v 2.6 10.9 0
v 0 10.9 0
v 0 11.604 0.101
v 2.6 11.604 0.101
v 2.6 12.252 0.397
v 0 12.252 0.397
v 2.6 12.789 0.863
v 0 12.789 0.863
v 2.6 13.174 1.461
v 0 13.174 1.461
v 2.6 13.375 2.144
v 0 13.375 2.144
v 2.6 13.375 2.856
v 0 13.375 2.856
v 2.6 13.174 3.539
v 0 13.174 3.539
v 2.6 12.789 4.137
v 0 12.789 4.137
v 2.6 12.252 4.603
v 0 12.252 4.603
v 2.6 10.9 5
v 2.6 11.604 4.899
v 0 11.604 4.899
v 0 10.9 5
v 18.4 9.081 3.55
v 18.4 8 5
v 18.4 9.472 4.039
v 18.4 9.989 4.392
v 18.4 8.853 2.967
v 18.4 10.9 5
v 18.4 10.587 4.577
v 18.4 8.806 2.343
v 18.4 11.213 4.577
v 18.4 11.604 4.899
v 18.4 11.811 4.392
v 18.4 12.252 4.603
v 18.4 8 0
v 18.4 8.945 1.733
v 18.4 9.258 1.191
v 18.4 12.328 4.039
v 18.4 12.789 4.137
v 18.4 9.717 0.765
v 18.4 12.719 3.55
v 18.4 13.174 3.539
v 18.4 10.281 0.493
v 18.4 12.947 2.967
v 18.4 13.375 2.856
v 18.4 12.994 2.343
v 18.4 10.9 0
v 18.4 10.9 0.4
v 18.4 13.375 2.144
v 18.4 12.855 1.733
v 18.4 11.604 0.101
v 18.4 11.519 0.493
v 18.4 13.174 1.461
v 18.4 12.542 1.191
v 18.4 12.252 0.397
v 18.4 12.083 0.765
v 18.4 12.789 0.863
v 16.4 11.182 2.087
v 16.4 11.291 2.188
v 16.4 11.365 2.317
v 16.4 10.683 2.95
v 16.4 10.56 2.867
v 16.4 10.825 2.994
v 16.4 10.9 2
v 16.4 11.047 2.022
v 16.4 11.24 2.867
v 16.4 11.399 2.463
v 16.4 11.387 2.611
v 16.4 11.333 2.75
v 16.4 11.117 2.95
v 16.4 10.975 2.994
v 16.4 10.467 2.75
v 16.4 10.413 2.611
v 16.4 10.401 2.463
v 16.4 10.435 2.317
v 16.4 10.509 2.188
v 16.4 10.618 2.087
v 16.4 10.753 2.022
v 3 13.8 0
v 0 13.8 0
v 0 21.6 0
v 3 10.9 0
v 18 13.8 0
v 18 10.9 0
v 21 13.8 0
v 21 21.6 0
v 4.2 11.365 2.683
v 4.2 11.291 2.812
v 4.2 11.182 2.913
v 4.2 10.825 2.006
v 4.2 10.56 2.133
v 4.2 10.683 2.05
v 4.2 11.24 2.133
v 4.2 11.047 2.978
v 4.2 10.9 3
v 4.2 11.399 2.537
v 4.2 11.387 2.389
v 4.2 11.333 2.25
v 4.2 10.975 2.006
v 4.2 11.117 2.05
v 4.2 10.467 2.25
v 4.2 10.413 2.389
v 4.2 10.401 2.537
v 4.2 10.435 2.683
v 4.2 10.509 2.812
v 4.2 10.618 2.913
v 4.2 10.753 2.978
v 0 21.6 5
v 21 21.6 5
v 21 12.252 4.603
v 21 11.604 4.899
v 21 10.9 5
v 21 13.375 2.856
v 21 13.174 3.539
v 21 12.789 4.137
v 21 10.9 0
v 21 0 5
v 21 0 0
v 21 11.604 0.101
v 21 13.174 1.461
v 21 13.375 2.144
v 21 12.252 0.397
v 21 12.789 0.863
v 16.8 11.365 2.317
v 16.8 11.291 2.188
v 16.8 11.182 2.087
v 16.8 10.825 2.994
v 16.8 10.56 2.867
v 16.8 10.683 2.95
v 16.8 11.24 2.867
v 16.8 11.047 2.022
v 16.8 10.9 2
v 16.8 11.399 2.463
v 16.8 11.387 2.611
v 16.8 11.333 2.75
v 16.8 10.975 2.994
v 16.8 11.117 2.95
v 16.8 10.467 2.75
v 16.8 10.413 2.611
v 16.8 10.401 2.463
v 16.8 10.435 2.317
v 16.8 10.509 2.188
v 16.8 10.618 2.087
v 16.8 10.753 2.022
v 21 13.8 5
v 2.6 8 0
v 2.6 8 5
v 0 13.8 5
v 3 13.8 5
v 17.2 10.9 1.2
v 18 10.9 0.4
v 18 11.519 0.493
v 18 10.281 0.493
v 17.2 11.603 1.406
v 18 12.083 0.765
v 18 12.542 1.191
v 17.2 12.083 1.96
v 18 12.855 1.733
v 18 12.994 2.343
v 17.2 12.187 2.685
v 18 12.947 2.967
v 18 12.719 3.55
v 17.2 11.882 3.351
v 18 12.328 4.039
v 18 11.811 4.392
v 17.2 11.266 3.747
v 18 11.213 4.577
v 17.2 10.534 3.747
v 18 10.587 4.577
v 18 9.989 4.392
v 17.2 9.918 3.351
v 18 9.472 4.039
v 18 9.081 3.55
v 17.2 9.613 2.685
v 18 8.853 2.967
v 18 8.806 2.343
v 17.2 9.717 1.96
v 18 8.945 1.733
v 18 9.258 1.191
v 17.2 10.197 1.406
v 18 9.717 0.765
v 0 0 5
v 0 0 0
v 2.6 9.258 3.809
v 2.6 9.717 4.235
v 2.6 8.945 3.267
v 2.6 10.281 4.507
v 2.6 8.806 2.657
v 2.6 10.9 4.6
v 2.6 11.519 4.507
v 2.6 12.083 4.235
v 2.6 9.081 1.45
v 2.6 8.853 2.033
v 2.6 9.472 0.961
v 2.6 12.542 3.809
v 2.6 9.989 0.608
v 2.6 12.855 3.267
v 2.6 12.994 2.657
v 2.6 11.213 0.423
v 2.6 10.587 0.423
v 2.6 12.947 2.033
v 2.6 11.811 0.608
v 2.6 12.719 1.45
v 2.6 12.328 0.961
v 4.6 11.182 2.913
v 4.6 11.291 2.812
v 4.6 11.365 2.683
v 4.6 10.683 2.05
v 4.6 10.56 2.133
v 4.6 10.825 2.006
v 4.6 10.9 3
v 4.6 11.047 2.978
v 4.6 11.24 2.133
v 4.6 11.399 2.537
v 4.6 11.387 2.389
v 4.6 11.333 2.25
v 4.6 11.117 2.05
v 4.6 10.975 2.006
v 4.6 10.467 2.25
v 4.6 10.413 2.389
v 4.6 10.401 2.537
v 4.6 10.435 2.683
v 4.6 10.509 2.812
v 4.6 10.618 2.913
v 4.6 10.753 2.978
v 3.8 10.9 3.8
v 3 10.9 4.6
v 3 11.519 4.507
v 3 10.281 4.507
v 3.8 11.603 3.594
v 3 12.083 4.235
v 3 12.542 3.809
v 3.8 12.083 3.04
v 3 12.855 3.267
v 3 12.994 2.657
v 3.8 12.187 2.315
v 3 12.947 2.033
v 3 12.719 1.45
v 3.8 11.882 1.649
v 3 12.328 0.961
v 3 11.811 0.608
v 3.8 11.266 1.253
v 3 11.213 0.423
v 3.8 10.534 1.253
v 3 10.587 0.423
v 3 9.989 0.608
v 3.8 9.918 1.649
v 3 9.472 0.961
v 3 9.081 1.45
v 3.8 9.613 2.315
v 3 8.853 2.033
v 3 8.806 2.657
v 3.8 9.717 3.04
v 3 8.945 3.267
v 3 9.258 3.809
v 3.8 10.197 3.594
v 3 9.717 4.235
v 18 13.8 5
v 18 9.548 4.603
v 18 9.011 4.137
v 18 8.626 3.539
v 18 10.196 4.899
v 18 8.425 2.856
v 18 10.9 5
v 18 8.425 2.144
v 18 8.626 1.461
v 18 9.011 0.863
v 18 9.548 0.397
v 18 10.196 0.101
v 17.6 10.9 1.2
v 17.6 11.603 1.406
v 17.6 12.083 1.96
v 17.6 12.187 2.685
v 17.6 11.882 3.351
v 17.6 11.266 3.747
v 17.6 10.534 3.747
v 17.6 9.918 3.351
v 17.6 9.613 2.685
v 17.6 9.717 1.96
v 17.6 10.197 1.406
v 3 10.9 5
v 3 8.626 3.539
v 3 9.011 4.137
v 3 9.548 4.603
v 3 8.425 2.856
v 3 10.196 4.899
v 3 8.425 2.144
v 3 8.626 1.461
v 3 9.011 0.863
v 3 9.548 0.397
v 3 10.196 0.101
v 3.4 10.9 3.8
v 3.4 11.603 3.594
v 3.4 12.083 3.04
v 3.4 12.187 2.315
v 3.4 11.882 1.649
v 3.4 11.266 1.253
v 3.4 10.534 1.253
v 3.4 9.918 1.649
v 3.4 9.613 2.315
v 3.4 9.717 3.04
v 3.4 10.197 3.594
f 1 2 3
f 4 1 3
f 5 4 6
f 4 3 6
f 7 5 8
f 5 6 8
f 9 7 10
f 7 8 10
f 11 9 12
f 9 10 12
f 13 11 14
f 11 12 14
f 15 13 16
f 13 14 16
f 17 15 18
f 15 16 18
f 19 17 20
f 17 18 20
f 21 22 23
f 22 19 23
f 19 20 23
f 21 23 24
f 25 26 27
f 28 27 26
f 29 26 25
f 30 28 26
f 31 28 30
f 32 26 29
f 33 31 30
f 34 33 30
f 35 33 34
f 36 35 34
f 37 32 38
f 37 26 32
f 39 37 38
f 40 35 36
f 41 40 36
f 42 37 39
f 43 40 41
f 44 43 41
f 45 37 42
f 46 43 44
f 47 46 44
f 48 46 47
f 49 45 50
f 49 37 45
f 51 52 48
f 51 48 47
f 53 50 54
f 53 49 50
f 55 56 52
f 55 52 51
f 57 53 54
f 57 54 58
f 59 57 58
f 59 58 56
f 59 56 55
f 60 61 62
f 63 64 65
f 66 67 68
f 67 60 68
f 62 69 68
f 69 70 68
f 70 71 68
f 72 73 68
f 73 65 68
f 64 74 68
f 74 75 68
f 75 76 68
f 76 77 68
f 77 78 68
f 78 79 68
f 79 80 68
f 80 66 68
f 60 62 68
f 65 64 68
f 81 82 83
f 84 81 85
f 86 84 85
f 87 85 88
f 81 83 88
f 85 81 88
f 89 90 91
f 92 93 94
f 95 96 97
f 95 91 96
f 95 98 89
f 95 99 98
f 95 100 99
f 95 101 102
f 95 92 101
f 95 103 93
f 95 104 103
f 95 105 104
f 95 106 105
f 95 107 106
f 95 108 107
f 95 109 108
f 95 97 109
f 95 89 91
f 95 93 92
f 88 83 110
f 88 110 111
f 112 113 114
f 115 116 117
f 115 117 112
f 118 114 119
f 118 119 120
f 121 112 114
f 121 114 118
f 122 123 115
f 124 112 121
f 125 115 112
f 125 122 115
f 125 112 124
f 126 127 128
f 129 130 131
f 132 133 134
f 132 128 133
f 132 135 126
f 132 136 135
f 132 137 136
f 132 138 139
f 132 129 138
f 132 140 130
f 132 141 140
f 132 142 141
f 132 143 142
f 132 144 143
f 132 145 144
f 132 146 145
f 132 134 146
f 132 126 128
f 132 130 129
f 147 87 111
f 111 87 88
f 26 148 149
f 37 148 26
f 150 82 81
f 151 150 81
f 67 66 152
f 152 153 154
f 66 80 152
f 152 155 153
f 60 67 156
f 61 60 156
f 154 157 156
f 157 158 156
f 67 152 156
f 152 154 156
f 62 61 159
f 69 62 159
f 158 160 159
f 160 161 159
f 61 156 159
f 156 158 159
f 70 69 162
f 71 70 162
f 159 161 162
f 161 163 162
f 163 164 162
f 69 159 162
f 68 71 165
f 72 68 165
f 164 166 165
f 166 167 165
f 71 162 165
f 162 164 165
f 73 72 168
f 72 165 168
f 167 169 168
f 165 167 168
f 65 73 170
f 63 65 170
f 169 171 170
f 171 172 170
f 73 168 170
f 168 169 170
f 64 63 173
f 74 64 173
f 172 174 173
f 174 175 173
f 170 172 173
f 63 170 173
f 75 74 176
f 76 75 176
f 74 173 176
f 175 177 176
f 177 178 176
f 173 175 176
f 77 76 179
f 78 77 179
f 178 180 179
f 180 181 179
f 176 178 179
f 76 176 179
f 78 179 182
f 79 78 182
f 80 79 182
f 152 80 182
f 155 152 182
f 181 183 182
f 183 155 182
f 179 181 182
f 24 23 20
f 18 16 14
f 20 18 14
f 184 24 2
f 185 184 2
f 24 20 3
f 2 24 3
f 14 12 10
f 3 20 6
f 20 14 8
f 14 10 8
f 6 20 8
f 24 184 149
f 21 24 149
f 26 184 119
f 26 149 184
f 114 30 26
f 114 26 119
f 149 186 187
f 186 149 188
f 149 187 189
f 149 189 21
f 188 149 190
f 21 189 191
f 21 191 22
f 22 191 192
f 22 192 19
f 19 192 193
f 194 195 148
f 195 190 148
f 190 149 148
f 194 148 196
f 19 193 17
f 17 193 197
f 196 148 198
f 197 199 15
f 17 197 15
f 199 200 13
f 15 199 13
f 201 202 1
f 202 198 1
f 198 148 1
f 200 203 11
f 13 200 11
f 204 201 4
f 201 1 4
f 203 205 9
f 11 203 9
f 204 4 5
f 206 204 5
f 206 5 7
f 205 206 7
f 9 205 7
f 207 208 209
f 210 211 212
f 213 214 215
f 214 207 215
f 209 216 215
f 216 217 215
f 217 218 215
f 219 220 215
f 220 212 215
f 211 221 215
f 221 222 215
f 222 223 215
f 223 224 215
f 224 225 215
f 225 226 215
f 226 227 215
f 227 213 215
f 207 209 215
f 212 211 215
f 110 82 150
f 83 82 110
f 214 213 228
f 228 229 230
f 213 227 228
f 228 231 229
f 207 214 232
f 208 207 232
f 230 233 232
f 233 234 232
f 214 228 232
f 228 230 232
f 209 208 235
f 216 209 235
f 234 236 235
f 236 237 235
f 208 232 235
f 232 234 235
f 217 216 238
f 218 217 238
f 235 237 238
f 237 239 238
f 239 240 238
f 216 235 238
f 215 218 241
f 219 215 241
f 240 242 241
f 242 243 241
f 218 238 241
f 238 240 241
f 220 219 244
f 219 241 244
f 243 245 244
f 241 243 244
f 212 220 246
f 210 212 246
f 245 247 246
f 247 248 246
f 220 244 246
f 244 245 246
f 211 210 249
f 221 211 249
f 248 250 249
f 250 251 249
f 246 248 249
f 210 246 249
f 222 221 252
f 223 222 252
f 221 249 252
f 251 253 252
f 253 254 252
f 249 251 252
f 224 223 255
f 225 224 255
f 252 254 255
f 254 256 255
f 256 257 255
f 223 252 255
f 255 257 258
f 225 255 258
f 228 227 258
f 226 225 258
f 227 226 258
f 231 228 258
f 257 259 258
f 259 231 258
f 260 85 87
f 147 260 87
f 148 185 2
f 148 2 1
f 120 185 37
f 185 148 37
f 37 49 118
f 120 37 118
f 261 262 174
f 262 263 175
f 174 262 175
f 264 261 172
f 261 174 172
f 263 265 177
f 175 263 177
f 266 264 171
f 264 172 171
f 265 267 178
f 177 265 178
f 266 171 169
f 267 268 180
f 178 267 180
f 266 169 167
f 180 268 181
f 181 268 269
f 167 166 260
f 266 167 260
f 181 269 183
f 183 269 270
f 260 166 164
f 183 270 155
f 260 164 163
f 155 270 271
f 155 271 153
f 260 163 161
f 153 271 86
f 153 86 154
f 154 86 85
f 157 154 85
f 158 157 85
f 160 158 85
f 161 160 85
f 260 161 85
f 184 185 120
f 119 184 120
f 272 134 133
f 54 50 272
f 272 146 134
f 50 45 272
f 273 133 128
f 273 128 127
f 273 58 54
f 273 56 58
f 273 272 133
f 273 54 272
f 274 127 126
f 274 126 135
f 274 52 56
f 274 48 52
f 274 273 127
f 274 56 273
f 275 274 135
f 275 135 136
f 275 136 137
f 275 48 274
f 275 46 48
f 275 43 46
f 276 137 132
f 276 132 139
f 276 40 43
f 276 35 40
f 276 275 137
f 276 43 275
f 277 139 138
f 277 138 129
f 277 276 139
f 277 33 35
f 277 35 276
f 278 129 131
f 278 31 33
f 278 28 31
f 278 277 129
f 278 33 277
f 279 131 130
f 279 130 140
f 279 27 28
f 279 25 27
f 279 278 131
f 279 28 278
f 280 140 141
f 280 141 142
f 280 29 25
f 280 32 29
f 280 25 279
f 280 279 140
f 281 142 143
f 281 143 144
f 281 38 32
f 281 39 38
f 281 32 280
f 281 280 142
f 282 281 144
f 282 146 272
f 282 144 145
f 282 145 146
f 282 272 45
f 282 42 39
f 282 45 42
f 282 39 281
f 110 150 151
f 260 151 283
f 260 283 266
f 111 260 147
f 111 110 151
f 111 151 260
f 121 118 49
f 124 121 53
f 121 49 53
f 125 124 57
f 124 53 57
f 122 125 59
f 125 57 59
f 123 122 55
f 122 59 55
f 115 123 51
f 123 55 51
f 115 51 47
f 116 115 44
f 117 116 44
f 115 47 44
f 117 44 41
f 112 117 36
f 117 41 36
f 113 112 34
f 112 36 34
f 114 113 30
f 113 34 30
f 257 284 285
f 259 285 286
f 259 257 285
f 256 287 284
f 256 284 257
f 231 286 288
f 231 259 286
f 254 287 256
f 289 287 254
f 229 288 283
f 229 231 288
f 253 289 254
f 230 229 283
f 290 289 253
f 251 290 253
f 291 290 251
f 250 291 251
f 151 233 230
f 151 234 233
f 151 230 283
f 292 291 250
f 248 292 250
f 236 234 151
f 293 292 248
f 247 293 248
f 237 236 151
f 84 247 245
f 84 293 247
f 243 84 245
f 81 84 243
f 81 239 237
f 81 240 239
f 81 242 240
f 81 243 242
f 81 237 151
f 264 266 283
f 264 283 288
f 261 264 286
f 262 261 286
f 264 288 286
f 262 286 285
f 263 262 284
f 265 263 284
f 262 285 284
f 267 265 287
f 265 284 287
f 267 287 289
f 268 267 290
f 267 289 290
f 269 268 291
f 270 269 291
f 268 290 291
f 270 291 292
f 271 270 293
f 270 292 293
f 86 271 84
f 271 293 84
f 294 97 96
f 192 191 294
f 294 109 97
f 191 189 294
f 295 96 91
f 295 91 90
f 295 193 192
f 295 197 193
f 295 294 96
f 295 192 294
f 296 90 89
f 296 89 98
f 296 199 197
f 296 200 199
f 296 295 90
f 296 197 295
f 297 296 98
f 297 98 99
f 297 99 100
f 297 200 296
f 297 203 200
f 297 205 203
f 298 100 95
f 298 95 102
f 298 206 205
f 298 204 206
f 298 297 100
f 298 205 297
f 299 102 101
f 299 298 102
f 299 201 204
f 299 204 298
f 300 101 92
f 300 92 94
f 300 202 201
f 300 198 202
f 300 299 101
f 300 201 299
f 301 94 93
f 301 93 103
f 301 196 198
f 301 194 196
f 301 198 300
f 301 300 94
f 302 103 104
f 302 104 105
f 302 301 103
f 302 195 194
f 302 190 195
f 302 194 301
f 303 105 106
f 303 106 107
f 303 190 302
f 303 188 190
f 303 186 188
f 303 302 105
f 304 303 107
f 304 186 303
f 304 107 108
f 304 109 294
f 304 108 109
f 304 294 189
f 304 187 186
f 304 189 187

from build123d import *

# Parameters (mm, degrees)
BOX001_W          = 15.8
BOX001_H          = 5.8
BOX001_DEPTH      = 5
CYLINDER_R        = 2.5
CYLINDER_DEPTH    = 21
BOX_W             = 21
BOX_H             = 10.9
BOX_DEPTH         = 5
BOX002_W          = 15
BOX002_H          = 10.5
BOX002_DEPTH      = 5
CYLINDER001_R     = 2.5
CYLINDER001_DEPTH = 15
BOX003_W          = 21
BOX003_H          = 7.8
BOX003_DEPTH      = 5


with BuildPart() as cone003:
    # Cone003 → Cone003 (revolve)
    with BuildSketch(Plane(origin=(16.8, 10.9, 2.5), x_dir=(0, 0, -1), z_dir=(0, -1, 0))):
        Polygon((0, 0), (0.5, 0), (2.1, 1.6), (0, 1.6), align=None)
    revolve(axis=Axis((16.8, 10.9, 2.5), (1, 0, 0)))


with BuildPart() as cube001:
    # Box001 → Box001 (new body)
    with BuildSketch(Plane(origin=(2.6, 8, 0), x_dir=(1, 0, 0), z_dir=(0, 0, 1))):
        with Locations((7.9, 2.9)):
            Rectangle(BOX001_W, BOX001_H)
    extrude(amount=BOX001_DEPTH)


with BuildPart() as cylinder:
    # Cylinder → Cylinder (new body)
    with BuildSketch(Plane(origin=(0, 10.9, 2.5), x_dir=(0, 0, -1), z_dir=(1, 0, 0))):
        Circle(CYLINDER_R)
    extrude(amount=CYLINDER_DEPTH)


with BuildPart() as cut:
    # Box → Box (new body)
    with BuildSketch(Plane.XY):
        with Locations((10.5, 5.45)):
            Rectangle(BOX_W, BOX_H)
    extrude(amount=BOX_DEPTH)

    # Fusion: union Cylinder
    add(cylinder.part)

    # Cut: cut Cube001
    add(cube001.part, mode=Mode.SUBTRACT)


with BuildPart() as fusion001:
    # Cone → Cone (revolve)
    with BuildSketch(Plane(origin=(4.2, 10.9, 2.5), x_dir=(0, 0, 1), z_dir=(0, -1, 0))):
        Polygon((0, 0), (0.5, 0), (2.1, 1.6), (0, 1.6), align=None)
    revolve(axis=Axis((4.2, 10.9, 2.5), (-1, 0, 0)))

    # Fusion001: union Cone003, Cut
    add(cone003.part)
    add(cut.part)


with BuildPart() as cone002:
    # Cone002 → Cone002 (revolve)
    with BuildSketch(Plane(origin=(4.6, 10.9, 2.5), x_dir=(0, 0, 1), z_dir=(0, -1, 0))):
        Polygon((0, 0), (0.5, 0), (2.5, 2), (0, 2), align=None)
    revolve(axis=Axis((4.6, 10.9, 2.5), (-1, 0, 0)))


with BuildPart() as fusion003:
    # Cone004 → Cone004 (revolve)
    with BuildSketch(Plane(origin=(16.4, 10.9, 2.5), x_dir=(0, 0, -1), z_dir=(0, -1, 0))):
        Polygon((0, 0), (0.5, 0), (2.5, 2), (0, 2), align=None)
    revolve(axis=Axis((16.4, 10.9, 2.5), (1, 0, 0)))

    # Fusion003: union Cone002
    add(cone002.part)


with BuildPart() as cube002:
    # Box002 → Box002 (new body)
    with BuildSketch(Plane(origin=(3, 10.9, 0), x_dir=(1, 0, 0), z_dir=(0, 0, 1))):
        with Locations((7.5, 5.25)):
            Rectangle(BOX002_W, BOX002_H)
    extrude(amount=BOX002_DEPTH)


with BuildPart() as cylinder001:
    # Cylinder001 → Cylinder001 (new body)
    with BuildSketch(Plane(origin=(3, 10.9, 2.5), x_dir=(0, 0, -1), z_dir=(1, 0, 0))):
        Circle(CYLINDER001_R)
    extrude(amount=CYLINDER001_DEPTH)


with BuildPart() as cut001:
    # Box003 → Box003 (new body)
    with BuildSketch(Plane(origin=(0, 13.8, 0), x_dir=(1, 0, 0), z_dir=(0, 0, 1))):
        with Locations((10.5, 3.9)):
            Rectangle(BOX003_W, BOX003_H)
    extrude(amount=BOX003_DEPTH)

    # Fusion002: union Cube002, Cylinder001
    add(cube002.part)
    add(cylinder001.part)

    # Cut001: cut Fusion003
    add(fusion003.part, mode=Mode.SUBTRACT)


solid = Compound([fusion001.part, cut001.part])
